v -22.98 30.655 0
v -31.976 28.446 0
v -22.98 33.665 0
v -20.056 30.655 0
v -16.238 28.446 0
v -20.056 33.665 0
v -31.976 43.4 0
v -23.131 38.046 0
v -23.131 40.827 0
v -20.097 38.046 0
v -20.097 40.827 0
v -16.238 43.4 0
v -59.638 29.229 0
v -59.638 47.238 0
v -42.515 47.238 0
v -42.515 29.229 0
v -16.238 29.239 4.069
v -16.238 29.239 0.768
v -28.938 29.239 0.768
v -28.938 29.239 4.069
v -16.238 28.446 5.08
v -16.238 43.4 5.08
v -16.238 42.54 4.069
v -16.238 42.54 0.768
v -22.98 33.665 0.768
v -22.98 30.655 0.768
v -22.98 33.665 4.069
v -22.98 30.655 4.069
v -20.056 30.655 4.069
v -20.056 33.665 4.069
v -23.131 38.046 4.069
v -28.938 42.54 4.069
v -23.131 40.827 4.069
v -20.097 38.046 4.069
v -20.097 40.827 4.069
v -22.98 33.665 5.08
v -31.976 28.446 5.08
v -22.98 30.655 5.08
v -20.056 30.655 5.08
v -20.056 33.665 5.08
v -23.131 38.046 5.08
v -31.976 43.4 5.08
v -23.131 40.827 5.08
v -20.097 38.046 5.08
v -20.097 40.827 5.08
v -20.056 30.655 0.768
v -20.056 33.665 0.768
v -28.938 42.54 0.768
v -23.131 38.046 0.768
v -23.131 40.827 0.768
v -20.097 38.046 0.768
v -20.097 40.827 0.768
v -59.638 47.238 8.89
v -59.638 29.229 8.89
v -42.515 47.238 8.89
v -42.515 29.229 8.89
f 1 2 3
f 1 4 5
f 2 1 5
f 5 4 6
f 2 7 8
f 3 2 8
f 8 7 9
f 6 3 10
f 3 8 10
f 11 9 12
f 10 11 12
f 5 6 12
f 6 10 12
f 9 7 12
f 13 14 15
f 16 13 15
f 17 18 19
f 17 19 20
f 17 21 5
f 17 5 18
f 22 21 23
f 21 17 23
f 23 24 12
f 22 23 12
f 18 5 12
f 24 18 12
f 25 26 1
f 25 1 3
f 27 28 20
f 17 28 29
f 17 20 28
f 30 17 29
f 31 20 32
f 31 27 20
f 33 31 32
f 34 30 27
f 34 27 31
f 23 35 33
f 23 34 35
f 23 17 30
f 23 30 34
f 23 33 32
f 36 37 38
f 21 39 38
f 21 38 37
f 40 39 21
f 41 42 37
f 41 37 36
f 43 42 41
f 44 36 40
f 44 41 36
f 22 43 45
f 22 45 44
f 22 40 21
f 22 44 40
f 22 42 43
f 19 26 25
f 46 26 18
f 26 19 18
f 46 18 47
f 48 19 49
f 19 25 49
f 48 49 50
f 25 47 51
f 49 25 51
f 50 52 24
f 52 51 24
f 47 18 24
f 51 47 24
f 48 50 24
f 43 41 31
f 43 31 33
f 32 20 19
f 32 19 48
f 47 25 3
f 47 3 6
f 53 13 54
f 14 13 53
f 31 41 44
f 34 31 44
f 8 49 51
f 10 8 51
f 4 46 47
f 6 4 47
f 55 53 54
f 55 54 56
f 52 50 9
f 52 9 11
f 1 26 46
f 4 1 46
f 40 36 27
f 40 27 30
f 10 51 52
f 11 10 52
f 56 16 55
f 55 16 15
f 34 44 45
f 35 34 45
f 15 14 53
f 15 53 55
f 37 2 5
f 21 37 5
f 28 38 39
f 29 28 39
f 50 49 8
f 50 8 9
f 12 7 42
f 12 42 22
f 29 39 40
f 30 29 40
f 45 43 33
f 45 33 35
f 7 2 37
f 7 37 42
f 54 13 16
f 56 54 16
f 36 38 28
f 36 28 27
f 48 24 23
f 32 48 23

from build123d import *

# Parameters (mm, degrees)
F0_W     = 17.123912
F0_H     = 18.009631
F1_DEPTH = 8.89
F2_W     = 15.73784
F2_H     = 14.954054
F3_DEPTH = 5.08
F4_W     = 13.300197
F4_H     = 3.301468
F5_DEPTH = 12.7
F6_W     = 3.033554
F6_H     = 2.780758
F7_DEPTH = 25.4
F8_W     = 2.924021
F8_H     = 3.010021
F9_DEPTH = 25.4


with BuildPart() as f1:
    # F0 (on Top) → F1 (new body)
    with BuildSketch(Plane.XY):
        with Locations((-51.076496, 38.23356)):
            Rectangle(F0_W, F0_H)
    extrude(amount=F1_DEPTH)


with BuildPart() as f3:
    # F2 (on Top) → F3 (new body)
    with BuildSketch(Plane.XY):
        with Locations((-24.107112, 35.923231)):
            Rectangle(F2_W, F2_H)
    extrude(amount=F3_DEPTH)

    # F4 (on face) → F5 (cut)
    with BuildSketch(Plane.YZ.offset(-16.238192)):
        with Locations((35.889502, 2.418494)):
            Rectangle(F4_W, F4_H)
    extrude(amount=-F5_DEPTH, mode=Mode.SUBTRACT)

    # F6 (on face) → F7 (cut)
    with BuildSketch(Plane.XY.offset(5.08)):
        with Locations((-21.614076, 39.43621)):
            Rectangle(F6_W, F6_H)
    extrude(amount=-F7_DEPTH, mode=Mode.SUBTRACT)

    # F8 (on face) → F9 (cut)
    with BuildSketch(Plane.XY.offset(5.08)):
        with Locations((-21.517665, 32.15999)):
            Rectangle(F8_W, F8_H)
    extrude(amount=-F9_DEPTH, mode=Mode.SUBTRACT)


solid = Compound([f1.part, f3.part])
